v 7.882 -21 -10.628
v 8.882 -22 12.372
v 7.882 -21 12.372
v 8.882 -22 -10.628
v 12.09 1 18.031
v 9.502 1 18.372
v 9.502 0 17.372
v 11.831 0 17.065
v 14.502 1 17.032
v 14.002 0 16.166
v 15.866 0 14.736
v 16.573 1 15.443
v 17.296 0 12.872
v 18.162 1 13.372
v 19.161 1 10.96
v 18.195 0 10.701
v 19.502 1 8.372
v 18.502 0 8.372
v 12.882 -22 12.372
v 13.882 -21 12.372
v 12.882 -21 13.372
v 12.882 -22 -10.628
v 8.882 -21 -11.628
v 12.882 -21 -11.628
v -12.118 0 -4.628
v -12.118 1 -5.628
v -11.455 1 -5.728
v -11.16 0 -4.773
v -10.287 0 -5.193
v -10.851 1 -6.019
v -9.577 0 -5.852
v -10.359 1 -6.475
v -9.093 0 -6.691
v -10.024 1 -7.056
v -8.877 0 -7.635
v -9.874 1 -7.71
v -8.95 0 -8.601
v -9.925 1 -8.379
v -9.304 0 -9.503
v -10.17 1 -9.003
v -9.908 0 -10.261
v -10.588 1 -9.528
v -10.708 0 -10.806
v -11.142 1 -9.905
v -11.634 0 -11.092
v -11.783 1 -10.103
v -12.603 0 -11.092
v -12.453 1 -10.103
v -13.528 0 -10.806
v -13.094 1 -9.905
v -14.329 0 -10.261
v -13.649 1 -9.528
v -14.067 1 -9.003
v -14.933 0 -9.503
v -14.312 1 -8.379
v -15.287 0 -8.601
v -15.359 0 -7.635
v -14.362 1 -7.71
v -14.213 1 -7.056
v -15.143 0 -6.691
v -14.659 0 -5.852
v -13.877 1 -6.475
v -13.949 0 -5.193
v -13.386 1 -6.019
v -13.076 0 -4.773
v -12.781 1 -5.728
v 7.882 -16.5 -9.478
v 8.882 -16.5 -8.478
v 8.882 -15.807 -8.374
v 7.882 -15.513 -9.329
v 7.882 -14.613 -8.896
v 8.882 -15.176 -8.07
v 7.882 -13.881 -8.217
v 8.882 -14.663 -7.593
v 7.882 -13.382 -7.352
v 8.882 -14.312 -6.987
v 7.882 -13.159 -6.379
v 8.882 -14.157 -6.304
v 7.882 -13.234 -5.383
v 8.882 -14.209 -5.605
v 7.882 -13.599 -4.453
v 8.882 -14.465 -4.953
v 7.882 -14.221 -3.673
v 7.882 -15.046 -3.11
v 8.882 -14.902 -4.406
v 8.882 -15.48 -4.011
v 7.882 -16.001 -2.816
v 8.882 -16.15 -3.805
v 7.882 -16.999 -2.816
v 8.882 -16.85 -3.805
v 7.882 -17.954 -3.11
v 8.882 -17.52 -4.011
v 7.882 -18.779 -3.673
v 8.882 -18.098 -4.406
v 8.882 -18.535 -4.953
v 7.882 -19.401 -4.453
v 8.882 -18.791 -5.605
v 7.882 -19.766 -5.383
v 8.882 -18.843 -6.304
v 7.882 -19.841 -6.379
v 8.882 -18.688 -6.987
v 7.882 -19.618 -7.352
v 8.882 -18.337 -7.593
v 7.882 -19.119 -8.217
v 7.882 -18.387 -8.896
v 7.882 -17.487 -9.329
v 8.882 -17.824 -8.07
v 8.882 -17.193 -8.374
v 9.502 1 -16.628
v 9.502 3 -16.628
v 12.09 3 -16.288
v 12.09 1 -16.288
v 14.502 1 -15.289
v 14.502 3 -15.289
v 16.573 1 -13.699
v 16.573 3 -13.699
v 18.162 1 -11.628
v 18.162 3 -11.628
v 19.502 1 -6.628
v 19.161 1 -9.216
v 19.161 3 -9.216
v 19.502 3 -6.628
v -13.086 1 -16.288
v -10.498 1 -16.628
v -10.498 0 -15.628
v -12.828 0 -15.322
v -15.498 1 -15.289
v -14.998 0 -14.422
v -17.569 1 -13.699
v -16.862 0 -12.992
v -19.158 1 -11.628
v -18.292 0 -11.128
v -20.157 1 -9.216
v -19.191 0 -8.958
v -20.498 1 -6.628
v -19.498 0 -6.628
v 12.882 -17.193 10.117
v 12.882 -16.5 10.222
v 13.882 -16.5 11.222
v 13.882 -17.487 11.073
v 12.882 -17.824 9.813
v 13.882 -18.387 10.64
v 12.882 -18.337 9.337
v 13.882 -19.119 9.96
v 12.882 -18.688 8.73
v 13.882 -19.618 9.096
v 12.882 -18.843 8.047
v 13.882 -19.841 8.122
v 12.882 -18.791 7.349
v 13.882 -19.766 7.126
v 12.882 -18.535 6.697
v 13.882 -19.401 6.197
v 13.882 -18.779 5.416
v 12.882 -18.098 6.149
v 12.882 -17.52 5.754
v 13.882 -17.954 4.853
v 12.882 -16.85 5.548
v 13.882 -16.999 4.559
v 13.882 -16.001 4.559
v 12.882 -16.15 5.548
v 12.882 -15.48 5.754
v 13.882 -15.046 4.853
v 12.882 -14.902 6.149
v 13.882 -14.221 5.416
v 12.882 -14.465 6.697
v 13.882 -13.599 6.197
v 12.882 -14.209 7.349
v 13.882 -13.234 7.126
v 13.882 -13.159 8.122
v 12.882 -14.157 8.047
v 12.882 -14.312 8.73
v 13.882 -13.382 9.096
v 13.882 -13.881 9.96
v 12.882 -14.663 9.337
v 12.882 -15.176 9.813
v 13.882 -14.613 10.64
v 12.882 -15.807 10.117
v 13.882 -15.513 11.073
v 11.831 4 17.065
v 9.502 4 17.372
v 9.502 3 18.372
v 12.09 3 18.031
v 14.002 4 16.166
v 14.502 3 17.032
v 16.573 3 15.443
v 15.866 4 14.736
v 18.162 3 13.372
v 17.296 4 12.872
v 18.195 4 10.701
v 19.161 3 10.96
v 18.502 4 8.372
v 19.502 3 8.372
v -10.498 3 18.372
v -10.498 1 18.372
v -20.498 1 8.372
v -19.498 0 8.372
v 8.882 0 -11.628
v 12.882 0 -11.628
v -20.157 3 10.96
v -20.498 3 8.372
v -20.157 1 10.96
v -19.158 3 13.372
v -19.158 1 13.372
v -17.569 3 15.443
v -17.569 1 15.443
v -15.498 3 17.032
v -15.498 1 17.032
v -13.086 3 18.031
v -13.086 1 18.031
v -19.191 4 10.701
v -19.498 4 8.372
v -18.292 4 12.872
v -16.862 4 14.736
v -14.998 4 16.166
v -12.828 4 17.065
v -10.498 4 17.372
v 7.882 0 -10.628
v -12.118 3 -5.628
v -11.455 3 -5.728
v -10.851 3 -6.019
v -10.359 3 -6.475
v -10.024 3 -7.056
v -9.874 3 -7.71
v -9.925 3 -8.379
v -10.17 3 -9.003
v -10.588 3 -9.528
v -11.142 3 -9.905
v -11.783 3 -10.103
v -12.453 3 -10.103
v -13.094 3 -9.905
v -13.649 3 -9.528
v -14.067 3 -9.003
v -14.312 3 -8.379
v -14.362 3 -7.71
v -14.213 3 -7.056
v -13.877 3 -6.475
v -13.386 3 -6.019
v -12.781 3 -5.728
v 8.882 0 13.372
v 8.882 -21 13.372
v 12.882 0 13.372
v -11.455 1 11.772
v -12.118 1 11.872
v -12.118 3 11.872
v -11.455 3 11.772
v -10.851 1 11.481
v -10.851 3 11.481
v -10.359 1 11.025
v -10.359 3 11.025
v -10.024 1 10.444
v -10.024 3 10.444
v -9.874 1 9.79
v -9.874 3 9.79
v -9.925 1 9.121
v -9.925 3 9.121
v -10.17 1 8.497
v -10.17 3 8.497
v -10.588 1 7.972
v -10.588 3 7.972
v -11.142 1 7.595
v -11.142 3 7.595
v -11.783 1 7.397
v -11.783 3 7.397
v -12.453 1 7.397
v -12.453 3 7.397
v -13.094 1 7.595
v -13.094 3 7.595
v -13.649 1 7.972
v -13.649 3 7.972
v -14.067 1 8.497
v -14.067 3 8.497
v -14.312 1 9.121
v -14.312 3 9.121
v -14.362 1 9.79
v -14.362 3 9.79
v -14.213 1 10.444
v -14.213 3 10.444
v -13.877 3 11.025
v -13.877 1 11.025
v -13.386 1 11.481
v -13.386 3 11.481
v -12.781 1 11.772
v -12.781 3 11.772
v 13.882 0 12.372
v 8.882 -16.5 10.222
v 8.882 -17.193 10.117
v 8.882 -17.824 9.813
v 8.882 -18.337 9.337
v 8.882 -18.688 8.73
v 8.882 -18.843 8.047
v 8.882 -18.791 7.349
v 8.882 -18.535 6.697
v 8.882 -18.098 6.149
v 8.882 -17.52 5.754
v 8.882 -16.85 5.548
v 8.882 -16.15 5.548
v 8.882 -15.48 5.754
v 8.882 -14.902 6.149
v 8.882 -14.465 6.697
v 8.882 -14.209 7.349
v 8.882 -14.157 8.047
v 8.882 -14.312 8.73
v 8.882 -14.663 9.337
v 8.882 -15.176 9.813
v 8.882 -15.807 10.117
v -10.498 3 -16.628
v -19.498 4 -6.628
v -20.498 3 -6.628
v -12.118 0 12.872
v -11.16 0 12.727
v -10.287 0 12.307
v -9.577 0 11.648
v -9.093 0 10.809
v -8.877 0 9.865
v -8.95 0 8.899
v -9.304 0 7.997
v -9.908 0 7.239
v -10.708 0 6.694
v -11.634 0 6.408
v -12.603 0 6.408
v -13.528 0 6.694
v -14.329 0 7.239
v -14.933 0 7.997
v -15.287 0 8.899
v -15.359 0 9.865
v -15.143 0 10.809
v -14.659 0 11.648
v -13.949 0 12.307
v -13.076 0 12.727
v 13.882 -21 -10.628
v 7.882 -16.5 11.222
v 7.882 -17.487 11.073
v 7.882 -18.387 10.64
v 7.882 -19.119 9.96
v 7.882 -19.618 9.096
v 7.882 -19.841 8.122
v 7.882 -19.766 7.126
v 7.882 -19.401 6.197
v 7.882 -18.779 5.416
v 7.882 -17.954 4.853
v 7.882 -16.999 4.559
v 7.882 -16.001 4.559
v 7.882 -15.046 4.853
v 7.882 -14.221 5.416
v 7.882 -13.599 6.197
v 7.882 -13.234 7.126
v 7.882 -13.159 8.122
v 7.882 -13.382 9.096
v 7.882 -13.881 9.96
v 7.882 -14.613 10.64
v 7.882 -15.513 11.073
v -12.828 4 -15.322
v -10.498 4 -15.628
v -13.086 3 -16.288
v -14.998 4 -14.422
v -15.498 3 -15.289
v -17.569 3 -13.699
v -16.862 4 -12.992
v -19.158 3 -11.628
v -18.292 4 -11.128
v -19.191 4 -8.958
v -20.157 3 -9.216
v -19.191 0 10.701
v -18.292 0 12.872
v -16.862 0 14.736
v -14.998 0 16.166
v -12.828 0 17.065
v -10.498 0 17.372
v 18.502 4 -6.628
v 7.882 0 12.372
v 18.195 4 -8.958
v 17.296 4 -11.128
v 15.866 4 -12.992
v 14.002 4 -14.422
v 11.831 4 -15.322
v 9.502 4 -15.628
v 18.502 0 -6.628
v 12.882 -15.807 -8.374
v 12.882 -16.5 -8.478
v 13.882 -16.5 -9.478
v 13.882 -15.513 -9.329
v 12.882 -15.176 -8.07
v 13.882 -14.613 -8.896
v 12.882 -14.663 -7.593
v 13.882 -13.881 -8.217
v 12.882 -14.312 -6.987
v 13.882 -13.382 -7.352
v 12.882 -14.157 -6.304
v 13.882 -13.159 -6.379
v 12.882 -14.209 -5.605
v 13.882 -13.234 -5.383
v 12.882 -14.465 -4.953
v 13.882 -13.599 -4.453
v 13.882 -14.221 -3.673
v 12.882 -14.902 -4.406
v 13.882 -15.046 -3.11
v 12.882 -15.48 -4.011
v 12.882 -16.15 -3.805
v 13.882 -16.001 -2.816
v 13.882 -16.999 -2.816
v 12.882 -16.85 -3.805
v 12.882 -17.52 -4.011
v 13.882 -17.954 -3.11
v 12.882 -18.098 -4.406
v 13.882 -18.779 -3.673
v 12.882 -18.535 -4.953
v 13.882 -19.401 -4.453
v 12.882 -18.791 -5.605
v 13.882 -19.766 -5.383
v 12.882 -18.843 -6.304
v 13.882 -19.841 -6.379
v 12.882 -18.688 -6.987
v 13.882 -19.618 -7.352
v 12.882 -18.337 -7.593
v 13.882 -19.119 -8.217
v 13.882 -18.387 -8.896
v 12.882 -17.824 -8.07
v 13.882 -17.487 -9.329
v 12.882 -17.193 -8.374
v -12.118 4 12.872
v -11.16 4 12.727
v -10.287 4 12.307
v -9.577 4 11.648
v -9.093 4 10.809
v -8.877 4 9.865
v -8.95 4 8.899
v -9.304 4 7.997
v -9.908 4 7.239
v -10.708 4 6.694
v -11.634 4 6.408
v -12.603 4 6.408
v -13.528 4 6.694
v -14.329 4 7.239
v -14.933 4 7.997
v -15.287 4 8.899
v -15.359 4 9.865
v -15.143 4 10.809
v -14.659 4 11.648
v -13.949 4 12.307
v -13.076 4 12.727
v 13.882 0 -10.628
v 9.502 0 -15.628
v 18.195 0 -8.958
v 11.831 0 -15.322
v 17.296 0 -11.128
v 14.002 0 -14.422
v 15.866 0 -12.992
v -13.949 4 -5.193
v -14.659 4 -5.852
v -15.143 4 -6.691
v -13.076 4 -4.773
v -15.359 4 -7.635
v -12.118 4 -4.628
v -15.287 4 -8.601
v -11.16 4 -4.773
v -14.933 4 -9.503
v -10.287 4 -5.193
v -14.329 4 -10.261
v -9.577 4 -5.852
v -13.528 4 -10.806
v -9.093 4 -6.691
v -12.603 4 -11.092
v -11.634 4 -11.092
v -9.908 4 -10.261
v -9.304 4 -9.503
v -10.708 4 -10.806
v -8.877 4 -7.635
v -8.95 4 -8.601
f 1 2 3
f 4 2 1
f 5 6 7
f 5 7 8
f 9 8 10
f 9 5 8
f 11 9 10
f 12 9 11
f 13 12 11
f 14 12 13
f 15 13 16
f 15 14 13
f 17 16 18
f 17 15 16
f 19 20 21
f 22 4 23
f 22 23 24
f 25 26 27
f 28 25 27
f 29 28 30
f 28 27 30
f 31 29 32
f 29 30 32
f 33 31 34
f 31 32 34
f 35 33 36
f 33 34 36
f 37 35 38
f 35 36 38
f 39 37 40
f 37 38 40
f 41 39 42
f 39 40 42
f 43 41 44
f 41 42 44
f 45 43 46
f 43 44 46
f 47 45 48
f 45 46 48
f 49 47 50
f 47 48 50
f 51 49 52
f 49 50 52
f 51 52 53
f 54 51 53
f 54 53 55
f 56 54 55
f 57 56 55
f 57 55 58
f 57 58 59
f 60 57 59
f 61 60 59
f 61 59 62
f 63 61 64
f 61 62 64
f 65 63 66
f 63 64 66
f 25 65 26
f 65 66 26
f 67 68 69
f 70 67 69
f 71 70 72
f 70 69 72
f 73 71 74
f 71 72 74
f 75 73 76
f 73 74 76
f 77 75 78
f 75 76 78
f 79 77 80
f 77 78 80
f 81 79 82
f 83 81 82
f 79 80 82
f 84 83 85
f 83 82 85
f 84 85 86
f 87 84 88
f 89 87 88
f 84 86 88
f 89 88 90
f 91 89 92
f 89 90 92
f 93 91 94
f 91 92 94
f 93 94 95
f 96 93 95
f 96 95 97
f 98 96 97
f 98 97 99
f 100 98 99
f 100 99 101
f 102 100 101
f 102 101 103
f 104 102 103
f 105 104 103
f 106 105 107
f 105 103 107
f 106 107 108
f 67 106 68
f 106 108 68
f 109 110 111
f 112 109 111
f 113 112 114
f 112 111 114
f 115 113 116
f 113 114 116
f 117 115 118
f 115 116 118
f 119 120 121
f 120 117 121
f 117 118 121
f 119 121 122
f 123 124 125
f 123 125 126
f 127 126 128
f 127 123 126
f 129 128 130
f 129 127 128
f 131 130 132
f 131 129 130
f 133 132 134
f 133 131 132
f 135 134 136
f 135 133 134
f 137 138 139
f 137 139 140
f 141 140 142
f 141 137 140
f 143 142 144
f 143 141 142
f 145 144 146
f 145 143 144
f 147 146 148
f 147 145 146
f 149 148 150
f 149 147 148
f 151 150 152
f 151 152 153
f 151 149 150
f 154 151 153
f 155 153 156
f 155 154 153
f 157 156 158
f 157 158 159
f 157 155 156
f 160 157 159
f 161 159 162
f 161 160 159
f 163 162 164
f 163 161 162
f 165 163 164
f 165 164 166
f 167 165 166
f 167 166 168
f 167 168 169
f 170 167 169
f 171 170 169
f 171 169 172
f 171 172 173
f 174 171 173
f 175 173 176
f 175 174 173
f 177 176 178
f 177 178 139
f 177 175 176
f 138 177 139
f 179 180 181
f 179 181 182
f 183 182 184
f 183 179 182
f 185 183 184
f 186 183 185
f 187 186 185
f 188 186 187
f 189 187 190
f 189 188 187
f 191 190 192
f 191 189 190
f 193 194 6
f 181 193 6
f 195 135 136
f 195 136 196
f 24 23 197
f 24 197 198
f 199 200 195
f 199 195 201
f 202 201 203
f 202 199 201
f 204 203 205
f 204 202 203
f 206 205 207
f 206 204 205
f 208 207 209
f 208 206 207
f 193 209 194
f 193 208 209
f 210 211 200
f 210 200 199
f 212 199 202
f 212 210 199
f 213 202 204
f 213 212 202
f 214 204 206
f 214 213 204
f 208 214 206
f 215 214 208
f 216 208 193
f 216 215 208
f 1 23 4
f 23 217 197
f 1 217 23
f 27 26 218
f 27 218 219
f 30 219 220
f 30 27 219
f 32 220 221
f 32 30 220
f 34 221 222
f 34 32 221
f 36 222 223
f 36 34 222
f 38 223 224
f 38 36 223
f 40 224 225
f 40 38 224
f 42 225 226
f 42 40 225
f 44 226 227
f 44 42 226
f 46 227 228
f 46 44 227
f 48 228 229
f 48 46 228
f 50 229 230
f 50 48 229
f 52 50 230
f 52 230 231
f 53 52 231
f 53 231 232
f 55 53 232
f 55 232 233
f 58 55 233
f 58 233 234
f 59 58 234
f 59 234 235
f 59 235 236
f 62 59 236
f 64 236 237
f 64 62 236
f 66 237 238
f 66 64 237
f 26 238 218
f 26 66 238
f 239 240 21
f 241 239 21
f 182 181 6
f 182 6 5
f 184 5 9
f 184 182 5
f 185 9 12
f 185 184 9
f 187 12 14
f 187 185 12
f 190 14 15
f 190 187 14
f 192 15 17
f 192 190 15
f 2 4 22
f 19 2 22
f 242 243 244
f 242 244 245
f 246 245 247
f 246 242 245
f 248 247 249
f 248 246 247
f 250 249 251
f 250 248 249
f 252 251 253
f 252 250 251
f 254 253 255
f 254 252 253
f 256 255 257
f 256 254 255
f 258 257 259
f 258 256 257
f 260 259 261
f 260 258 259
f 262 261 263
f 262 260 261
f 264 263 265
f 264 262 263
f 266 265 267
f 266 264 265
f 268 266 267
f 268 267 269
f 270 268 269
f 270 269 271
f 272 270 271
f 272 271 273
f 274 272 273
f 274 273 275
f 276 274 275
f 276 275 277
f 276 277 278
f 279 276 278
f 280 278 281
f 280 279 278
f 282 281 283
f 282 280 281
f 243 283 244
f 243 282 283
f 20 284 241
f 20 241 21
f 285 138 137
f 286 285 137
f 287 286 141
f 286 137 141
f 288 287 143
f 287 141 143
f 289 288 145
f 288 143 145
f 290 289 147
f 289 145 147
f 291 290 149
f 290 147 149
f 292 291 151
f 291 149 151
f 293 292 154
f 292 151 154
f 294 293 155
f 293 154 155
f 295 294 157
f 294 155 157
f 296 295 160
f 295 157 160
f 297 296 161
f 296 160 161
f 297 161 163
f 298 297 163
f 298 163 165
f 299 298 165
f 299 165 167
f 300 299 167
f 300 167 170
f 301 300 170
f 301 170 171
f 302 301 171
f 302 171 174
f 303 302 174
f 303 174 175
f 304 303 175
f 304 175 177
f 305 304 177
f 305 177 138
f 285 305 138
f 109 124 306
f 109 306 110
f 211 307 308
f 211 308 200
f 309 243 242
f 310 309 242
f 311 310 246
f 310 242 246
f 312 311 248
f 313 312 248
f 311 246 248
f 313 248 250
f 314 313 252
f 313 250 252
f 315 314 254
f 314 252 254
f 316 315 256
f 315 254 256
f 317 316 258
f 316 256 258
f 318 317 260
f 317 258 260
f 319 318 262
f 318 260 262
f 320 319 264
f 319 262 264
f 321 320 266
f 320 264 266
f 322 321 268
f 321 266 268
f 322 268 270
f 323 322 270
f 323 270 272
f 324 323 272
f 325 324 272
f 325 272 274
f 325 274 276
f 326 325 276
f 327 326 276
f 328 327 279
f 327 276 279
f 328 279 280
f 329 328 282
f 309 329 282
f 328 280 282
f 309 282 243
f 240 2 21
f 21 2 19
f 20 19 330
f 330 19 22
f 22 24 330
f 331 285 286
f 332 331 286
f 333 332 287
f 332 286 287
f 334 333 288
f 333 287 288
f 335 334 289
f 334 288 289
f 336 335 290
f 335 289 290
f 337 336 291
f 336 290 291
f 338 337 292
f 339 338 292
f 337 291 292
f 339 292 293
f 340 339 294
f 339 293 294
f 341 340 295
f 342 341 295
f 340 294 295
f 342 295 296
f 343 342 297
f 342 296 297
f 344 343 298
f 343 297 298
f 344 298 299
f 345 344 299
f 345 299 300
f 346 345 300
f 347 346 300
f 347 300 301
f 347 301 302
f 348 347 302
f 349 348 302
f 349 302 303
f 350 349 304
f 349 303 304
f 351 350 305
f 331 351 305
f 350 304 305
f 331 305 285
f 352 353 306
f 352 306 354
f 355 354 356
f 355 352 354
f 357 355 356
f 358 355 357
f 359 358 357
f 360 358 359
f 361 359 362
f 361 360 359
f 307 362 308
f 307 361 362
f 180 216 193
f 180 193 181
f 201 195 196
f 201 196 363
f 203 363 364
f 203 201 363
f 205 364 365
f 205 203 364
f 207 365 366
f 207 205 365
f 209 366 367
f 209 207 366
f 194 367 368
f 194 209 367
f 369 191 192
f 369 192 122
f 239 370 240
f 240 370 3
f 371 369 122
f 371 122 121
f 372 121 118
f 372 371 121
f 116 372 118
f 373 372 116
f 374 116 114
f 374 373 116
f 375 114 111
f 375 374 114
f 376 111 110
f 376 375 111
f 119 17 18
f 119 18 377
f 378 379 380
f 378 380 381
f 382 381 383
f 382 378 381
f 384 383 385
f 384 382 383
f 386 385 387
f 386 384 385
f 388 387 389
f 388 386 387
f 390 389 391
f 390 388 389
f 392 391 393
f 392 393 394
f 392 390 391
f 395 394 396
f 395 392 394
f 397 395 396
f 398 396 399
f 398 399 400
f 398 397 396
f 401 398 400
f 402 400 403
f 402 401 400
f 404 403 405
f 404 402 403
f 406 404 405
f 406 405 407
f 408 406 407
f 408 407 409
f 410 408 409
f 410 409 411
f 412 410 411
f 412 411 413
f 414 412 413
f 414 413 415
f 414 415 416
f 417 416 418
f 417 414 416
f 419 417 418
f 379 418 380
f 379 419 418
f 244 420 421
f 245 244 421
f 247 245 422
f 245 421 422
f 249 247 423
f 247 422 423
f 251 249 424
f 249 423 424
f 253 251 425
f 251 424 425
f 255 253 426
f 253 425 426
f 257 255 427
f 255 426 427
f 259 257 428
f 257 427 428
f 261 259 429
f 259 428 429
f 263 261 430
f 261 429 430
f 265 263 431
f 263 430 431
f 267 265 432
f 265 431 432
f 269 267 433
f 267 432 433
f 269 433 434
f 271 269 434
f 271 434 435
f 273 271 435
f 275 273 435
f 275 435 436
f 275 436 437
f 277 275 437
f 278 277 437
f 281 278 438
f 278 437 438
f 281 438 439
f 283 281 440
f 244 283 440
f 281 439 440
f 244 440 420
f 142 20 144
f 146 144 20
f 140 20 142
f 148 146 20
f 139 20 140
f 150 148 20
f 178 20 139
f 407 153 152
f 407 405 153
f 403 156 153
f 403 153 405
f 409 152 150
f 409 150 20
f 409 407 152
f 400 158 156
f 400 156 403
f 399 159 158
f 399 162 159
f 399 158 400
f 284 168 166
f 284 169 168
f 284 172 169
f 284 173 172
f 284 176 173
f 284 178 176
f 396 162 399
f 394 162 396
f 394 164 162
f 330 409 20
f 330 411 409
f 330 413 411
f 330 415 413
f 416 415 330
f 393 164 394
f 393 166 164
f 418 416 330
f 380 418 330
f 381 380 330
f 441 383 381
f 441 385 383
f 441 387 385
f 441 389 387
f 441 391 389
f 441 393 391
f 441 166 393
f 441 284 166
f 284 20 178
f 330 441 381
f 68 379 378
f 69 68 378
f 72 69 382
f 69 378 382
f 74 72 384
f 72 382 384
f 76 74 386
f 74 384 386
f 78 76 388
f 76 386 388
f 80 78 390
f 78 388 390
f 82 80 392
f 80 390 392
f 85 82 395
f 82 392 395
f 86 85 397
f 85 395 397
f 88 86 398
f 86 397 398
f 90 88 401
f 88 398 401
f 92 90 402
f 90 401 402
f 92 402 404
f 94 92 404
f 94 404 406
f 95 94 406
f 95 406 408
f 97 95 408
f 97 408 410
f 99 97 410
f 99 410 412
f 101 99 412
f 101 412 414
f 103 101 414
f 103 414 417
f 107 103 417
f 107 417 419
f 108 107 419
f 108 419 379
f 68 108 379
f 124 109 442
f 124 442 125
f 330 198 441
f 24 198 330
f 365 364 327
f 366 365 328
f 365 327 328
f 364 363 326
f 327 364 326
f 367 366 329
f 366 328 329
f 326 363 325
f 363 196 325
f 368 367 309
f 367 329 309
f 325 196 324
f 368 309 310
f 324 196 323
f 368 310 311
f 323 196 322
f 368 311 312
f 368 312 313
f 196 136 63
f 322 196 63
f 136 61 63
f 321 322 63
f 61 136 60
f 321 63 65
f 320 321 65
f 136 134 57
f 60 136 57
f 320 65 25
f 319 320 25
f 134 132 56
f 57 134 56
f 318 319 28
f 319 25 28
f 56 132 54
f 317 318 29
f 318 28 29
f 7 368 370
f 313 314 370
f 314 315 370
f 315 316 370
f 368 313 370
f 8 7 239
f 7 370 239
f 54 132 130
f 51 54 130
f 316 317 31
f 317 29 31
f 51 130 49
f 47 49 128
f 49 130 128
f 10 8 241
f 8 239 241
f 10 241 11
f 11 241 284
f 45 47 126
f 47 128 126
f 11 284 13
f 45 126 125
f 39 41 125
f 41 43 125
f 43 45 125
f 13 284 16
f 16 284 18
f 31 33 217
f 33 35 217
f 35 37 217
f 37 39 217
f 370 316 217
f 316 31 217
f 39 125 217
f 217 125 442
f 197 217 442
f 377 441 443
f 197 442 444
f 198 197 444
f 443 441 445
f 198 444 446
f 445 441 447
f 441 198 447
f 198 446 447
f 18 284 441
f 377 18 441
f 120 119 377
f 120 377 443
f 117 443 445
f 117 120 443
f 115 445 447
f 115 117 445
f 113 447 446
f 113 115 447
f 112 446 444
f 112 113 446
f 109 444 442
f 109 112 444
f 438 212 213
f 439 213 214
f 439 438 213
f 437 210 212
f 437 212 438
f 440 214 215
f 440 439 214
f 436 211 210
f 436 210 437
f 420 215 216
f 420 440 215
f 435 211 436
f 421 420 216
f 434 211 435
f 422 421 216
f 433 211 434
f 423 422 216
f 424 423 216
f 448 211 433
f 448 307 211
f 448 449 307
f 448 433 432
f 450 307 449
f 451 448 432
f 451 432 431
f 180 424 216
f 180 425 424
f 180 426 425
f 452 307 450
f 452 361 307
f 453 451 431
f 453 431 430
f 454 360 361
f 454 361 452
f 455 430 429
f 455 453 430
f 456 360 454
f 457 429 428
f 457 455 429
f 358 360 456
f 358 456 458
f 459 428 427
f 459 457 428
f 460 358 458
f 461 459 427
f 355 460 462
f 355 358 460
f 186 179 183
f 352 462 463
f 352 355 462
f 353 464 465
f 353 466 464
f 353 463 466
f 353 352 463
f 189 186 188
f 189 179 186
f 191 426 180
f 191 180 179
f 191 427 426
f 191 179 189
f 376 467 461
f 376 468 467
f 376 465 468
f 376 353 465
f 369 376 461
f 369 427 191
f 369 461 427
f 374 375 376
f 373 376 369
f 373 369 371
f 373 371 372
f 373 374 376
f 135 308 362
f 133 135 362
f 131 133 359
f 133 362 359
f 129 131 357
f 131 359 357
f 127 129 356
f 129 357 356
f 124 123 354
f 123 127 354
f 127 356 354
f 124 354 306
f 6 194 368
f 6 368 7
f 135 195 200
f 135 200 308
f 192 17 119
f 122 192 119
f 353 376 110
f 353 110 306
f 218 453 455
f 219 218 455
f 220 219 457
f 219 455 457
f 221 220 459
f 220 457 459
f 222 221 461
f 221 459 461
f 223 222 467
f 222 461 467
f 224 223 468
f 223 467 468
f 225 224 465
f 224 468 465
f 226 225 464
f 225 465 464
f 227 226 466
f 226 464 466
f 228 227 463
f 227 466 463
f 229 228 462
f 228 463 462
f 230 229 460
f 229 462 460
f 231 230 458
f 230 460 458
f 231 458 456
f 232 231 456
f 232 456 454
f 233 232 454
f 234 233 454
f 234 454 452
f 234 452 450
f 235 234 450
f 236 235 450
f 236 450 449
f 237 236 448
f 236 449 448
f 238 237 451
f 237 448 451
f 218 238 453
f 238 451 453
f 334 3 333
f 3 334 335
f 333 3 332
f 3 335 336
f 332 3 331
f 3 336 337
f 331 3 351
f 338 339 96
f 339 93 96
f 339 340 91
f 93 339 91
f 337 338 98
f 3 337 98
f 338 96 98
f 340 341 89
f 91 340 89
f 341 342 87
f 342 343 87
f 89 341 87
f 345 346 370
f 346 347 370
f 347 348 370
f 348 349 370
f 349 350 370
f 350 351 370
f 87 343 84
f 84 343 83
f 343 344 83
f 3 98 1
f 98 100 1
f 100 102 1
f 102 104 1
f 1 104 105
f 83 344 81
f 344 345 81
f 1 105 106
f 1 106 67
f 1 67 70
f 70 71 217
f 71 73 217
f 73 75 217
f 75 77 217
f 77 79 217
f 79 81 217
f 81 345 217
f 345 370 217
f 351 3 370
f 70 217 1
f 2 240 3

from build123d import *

# Parameters (mm, degrees)
SKETCH1_W           = 40
SKETCH1_H           = 35
SKETCH1_R           = 2.25
SKETCH1_W_2         = 6
SKETCH1_H_2         = 25
BOSS_EXTRUDE1_DEPTH = 4
SKETCH2_W           = 6
SKETCH2_H           = 25
BOSS_EXTRUDE2_DEPTH = 26
SKETCH3_R           = 2.35
CUT_EXTRUDE1_DEPTH  = 45.760529843
FILLET1_R           = 10
CHAMFER1_SIZE       = 1


with BuildPart() as part:
    # Sketch1 → Boss-Extrude1 (new body)
    with BuildSketch(Plane(origin=(0, 0, 0), x_dir=(1, 0, 0), z_dir=(0, 1, 0))):
        with Locations((-0.498134051, -0.87173459)):
            Rectangle(SKETCH1_W, SKETCH1_H)
        with Locations(Location((-12.118134051, -9.62173459, 0), (0, 0, 270))):
            Circle(SKETCH1_R, mode=Mode.SUBTRACT)
        with Locations(Location((-12.118134051, 7.87826541, 0), (0, 0, 270))):
            Circle(SKETCH1_R, mode=Mode.SUBTRACT)
        with Locations((10.881865949, -0.87173459)):
            Rectangle(SKETCH1_W_2, SKETCH1_H_2, mode=Mode.SUBTRACT)
    extrude(amount=BOSS_EXTRUDE1_DEPTH)

    # Sketch2 → Boss-Extrude2 (add)
    with BuildSketch(Plane(origin=(0, 4, 0), x_dir=(1, 0, 0), z_dir=(0, 1, 0))):
        with Locations((10.881865949, -0.87173459)):
            Rectangle(SKETCH2_W, SKETCH2_H)
    extrude(amount=-BOSS_EXTRUDE2_DEPTH)

    # Sketch3 → Cut-Extrude1 (cut, through all)
    with BuildSketch(Plane(origin=(13.881865949, 0, 0), x_dir=(0, 0, -1), z_dir=(1, 0, 0))):
        with Locations((6.12826541, -16.5)):
            Circle(SKETCH3_R)
        with Locations(Location((-7.87173459, -16.5, 0), (0, 0, 180))):
            Circle(SKETCH3_R)
    extrude(amount=-CUT_EXTRUDE1_DEPTH, mode=Mode.SUBTRACT)

    # Fillet1
    fillet1_edges = [part.edges().sort_by_distance(p)[0] for p in [
        (19.501865949, 2, 18.37173459),
        (-20.498134051, 2, 18.37173459),
        (-20.498134051, 2, -16.62826541),
        (19.501865949, 2, -16.62826541),
    ]]
    fillet(fillet1_edges, radius=FILLET1_R)

    # Chamfer1
    chamfer1_edges = [part.edges().sort_by_distance(p)[0] for p in [
        (-12.118134051, 0, 7.37173459),
        (-12.118134051, 4, 7.37173459),
        (-12.118134051, 0, -10.12826541),
        (-12.118134051, 4, -10.12826541),
        (7.881865949, -11, -11.62826541),
        (10.881865949, -22, -11.62826541),
        (13.881865949, -11, -11.62826541),
        (13.881865949, -22, 0.87173459),
        (13.881865949, -11, 13.37173459),
        (10.881865949, -22, 13.37173459),
        (7.881865949, -11, 13.37173459),
        (7.881865949, -22, 0.87173459),
        (7.881865949, -16.5, -3.77826541),
        (13.881865949, -16.5, -3.77826541),
        (7.881865949, -16.5, 5.52173459),
        (13.881865949, -16.5, 5.52173459),
        (19.501865949, 0, 0.87173459),
        (19.501865949, 4, 0.87173459),
        (-0.498134051, 0, 18.37173459),
        (-20.498134051, 0, 0.87173459),
        (-0.498134051, 0, -16.62826541),
        (-17.569201863, 0, 15.442802401),
        (-17.569201863, 0, -13.699333222),
        (16.572933761, 0, -13.699333222),
        (16.572933761, 0, 15.442802401),
        (-0.498134051, 4, 18.37173459),
        (-0.498134051, 4, -16.62826541),
        (-20.498134051, 4, 0.87173459),
        (-17.569201863, 4, 15.442802401),
        (-17.569201863, 4, -13.699333222),
        (16.572933761, 4, -13.699333222),
        (16.572933761, 4, 15.442802401),
    ]]
    chamfer(chamfer1_edges, length=CHAMFER1_SIZE)


solid = part.part
